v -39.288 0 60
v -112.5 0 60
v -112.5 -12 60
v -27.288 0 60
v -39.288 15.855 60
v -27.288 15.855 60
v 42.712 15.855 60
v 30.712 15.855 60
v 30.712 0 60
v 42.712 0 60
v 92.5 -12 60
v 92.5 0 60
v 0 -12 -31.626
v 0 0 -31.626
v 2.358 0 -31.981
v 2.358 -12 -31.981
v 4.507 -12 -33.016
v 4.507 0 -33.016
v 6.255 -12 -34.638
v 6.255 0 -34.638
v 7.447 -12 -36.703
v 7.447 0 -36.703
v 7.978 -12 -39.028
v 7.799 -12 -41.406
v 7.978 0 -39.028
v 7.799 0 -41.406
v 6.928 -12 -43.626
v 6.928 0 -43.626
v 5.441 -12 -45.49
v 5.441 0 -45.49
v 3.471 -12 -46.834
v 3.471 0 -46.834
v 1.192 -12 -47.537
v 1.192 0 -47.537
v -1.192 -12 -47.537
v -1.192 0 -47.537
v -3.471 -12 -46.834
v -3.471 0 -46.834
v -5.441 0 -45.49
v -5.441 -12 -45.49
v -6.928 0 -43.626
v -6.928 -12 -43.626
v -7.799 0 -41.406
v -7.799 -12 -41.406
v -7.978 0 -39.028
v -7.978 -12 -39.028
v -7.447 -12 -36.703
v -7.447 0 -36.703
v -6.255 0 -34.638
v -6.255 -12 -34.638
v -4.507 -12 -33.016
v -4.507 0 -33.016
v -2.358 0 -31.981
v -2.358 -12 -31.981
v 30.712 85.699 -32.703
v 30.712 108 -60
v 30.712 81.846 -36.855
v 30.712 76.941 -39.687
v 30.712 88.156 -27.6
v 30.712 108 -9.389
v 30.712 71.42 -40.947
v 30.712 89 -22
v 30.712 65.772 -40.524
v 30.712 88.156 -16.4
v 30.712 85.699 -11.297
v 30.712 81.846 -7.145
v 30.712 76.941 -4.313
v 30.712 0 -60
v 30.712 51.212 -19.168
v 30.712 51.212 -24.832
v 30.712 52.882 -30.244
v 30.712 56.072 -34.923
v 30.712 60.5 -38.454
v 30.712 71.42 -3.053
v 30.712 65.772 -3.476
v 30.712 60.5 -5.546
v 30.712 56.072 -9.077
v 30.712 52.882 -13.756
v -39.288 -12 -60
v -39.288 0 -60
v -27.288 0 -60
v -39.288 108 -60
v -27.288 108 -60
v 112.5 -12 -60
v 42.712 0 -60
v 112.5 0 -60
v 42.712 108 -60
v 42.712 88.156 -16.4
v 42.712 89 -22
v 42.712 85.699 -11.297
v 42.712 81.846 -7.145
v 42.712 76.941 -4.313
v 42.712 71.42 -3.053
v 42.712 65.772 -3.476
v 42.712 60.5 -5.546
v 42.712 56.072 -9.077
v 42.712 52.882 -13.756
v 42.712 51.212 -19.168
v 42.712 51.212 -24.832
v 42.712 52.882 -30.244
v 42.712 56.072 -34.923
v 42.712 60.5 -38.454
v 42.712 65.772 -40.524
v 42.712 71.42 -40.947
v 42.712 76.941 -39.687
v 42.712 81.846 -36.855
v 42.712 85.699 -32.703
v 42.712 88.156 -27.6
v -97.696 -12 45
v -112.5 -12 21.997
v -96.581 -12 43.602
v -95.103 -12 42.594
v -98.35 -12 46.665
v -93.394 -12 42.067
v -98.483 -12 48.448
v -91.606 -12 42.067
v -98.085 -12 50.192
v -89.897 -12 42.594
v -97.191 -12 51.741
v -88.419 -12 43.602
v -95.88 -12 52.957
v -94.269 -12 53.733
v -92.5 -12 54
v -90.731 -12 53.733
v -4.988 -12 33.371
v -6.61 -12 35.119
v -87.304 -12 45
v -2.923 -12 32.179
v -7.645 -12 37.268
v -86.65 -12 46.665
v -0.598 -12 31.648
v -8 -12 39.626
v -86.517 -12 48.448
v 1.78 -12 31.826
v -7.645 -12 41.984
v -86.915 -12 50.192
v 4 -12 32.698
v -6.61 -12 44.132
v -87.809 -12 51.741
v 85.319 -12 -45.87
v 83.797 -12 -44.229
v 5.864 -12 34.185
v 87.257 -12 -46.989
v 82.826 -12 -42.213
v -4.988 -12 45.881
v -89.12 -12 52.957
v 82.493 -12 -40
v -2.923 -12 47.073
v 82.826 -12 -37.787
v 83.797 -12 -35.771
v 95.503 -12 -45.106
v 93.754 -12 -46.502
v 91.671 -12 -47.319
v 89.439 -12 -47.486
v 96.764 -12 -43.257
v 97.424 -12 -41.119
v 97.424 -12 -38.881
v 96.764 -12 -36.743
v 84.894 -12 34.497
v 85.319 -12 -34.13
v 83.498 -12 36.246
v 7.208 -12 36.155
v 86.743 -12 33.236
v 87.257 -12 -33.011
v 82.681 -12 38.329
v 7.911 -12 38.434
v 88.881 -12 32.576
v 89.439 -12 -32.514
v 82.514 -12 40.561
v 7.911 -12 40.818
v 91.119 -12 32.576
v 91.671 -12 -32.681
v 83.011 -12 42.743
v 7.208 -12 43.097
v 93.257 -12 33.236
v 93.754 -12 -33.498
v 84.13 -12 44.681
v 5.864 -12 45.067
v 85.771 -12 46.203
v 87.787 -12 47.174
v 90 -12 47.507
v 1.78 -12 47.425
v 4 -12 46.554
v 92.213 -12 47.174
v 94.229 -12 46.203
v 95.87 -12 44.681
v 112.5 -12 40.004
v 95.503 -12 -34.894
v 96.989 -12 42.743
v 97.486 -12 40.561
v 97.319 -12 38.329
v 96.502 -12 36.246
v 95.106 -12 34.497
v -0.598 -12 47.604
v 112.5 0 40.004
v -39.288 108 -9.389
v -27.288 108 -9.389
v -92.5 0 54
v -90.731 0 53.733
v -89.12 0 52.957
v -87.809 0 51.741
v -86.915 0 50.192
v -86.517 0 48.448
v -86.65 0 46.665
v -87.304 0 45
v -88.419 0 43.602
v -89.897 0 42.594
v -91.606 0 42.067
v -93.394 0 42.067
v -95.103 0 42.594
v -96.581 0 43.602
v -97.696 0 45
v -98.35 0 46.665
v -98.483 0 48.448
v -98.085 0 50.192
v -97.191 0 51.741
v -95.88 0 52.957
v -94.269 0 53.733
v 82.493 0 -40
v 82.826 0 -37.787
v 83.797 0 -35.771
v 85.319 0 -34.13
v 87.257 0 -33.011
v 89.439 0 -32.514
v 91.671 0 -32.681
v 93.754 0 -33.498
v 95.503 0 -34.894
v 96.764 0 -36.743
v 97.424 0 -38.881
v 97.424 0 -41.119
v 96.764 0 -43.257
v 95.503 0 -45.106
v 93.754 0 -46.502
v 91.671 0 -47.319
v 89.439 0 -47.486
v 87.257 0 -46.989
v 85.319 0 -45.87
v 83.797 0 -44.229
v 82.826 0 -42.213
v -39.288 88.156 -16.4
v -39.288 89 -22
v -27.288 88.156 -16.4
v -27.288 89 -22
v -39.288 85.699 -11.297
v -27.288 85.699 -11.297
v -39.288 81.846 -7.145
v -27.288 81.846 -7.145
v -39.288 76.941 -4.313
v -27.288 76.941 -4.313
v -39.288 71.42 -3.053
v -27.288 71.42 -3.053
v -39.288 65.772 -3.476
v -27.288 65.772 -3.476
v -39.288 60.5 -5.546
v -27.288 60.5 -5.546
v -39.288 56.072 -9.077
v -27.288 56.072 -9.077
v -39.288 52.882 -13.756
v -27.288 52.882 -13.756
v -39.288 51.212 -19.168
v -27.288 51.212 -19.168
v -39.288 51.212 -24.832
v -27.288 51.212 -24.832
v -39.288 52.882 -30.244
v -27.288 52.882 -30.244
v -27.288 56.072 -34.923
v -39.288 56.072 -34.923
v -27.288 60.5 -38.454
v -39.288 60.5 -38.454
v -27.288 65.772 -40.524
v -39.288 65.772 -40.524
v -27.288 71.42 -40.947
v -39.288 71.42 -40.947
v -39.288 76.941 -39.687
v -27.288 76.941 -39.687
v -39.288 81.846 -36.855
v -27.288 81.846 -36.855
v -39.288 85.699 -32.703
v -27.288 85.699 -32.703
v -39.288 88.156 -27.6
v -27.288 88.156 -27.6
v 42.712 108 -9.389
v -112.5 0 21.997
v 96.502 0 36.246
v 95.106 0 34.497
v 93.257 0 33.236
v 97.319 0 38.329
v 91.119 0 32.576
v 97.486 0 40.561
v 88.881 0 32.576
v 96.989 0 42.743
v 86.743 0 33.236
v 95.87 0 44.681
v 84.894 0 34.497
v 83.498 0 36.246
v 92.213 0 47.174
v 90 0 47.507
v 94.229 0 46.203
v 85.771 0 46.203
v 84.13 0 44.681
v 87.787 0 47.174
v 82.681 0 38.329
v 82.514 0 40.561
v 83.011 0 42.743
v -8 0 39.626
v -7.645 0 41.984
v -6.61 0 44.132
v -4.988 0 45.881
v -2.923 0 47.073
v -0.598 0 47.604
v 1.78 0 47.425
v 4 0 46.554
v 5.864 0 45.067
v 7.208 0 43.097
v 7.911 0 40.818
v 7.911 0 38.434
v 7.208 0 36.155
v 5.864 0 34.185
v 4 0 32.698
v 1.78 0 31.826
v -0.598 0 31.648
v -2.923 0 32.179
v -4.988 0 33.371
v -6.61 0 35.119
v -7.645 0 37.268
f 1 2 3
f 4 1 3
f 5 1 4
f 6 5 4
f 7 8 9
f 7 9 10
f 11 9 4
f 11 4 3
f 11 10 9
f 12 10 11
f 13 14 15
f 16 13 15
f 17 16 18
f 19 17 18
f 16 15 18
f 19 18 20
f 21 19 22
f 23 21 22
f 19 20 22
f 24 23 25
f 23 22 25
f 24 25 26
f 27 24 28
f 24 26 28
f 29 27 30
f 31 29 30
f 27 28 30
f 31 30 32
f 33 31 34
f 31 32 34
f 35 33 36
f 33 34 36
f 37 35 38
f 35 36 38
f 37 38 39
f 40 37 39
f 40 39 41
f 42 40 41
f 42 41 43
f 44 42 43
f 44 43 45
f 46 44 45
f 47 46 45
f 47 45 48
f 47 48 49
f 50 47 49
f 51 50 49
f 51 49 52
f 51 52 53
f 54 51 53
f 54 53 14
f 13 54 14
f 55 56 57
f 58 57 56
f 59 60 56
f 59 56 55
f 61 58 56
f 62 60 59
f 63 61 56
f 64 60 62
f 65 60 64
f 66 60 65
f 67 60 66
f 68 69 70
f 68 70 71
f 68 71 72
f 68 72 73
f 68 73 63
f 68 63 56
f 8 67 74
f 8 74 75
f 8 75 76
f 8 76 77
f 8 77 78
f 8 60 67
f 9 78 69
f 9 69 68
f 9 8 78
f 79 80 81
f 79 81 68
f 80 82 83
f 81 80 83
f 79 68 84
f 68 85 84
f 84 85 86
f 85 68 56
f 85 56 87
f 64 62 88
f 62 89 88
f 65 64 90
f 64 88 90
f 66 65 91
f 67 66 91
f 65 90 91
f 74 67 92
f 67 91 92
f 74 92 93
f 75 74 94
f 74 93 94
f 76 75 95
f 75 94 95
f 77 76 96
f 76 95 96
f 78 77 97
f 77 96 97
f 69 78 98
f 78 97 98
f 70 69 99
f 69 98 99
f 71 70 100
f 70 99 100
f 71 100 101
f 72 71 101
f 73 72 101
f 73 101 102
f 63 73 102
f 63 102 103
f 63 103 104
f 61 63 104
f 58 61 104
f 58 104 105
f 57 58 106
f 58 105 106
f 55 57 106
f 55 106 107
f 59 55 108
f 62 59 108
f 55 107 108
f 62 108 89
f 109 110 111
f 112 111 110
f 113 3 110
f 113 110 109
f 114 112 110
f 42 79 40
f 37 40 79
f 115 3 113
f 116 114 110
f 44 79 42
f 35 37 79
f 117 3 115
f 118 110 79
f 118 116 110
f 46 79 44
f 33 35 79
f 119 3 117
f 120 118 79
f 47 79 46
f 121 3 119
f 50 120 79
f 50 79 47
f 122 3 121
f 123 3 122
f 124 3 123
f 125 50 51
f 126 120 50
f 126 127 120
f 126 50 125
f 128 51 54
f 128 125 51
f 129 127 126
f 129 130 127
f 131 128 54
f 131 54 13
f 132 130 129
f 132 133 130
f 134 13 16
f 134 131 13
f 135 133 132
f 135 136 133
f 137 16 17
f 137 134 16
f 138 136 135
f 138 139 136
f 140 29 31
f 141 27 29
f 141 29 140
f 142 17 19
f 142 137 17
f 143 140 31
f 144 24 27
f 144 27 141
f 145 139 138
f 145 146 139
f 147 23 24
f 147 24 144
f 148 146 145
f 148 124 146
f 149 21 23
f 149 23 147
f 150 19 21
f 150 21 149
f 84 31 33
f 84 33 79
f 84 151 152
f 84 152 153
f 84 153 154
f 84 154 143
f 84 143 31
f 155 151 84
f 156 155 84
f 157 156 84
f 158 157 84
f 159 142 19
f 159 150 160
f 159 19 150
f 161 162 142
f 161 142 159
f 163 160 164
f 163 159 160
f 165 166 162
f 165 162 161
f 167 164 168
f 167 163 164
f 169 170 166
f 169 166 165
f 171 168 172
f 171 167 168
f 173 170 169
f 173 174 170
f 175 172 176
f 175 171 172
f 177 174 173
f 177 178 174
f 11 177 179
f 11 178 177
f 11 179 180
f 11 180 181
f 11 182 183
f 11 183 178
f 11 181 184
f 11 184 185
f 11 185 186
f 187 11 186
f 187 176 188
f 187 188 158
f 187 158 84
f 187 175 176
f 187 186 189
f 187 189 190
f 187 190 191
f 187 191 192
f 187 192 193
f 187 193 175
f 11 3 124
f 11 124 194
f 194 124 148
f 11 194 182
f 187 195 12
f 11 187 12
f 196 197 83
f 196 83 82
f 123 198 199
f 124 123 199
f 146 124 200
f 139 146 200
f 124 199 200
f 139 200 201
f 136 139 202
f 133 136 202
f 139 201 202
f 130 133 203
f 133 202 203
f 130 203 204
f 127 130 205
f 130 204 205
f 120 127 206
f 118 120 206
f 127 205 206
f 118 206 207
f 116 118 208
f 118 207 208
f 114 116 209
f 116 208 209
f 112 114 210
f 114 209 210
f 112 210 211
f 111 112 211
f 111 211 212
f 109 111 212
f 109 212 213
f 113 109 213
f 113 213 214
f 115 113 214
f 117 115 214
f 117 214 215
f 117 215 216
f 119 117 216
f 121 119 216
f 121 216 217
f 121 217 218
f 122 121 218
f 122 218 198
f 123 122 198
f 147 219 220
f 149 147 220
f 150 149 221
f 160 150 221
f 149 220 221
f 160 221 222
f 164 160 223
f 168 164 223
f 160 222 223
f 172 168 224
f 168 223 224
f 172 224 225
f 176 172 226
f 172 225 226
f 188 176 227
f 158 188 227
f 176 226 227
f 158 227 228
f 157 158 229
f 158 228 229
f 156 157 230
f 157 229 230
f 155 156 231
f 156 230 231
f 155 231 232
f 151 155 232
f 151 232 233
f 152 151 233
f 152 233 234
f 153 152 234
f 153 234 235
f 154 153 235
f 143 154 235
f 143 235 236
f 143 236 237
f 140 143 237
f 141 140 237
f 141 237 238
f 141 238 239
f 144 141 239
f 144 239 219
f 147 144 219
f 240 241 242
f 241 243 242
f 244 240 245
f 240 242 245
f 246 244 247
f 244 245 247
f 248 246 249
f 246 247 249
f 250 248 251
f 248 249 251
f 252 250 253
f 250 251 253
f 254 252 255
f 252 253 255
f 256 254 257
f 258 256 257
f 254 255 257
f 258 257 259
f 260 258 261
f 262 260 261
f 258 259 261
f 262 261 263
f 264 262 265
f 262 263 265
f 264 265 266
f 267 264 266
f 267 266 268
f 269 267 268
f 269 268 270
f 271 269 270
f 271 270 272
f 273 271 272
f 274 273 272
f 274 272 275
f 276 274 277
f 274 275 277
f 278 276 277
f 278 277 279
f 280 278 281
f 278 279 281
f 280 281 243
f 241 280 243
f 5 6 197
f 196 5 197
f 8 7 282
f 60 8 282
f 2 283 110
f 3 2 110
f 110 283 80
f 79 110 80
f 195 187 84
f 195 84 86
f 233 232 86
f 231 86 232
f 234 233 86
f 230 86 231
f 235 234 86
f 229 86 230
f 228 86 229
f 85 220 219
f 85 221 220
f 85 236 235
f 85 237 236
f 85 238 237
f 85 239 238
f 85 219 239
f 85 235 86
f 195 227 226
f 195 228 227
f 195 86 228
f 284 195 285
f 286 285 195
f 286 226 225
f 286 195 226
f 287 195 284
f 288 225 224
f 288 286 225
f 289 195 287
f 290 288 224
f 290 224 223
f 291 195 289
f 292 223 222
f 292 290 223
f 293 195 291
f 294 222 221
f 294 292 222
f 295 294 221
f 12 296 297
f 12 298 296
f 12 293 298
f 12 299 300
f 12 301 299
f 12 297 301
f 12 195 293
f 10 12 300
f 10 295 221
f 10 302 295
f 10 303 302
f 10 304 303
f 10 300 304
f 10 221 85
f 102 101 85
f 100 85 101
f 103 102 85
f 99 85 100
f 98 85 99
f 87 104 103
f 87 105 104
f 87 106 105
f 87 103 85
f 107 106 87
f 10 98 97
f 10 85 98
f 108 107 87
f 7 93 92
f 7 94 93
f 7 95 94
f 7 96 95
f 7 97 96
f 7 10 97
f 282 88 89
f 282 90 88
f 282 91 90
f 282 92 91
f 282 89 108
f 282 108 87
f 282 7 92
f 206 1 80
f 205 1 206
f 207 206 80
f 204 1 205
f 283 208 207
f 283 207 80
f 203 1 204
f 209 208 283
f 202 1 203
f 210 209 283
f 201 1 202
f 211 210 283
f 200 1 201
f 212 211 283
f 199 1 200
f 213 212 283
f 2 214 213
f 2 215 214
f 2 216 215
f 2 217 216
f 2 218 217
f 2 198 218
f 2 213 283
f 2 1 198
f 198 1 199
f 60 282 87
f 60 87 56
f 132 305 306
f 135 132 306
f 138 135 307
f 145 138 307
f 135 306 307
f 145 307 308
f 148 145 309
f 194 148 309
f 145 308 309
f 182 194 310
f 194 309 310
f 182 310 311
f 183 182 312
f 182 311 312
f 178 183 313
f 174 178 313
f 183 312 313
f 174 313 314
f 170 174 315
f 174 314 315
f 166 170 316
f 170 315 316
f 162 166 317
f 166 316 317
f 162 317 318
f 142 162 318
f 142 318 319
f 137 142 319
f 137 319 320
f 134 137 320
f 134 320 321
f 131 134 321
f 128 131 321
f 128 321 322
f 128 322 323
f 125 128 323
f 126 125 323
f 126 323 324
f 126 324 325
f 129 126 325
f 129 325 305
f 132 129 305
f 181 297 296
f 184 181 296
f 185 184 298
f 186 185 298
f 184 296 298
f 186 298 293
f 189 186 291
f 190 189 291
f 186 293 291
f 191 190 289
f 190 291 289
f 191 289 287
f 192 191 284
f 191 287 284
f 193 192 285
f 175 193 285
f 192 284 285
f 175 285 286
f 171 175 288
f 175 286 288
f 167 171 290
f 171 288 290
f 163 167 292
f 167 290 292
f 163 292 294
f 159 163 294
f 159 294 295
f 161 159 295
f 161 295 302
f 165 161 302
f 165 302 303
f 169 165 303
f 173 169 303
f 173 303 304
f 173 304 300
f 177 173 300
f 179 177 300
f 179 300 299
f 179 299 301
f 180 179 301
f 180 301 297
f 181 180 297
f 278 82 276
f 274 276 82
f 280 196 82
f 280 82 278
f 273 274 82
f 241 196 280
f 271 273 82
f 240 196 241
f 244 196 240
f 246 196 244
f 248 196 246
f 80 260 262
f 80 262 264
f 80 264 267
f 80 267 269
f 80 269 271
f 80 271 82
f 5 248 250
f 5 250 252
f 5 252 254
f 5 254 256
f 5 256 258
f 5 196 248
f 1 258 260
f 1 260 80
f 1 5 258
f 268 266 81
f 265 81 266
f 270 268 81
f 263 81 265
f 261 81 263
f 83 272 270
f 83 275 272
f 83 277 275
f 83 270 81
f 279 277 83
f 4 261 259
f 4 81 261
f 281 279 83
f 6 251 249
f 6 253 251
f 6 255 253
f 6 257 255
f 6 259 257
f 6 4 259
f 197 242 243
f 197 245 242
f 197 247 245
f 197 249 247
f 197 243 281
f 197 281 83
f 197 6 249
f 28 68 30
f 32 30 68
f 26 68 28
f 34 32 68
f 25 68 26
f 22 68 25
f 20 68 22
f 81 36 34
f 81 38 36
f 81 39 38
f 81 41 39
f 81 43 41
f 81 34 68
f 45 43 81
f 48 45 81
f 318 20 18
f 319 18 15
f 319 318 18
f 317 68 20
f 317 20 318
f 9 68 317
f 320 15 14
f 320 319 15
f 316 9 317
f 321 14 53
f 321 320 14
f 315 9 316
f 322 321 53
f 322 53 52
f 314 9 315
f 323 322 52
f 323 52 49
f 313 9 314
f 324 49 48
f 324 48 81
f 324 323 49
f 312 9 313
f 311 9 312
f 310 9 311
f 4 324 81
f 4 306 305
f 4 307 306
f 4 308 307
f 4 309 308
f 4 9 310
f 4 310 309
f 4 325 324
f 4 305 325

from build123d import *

# Parameters (mm, degrees)
BOSS_EXTRUDE1_DEPTH = 60
CUT_EXTRUDE1_DEPTH  = 120
CUT_EXTRUDE2_DEPTH  = 120
CUT_EXTRUDE3_DEPTH  = 60
SKETCH7_R           = 19
CUT_EXTRUDE4_DEPTH  = 60
SKETCH10_R          = 8
SKETCH10_R_2        = 7.507478142
SKETCH10_R_3        = 6
CUT_EXTRUDE5_DEPTH  = 120


with BuildPart() as part:
    # Sketch1 → Boss-Extrude1 (new, symmetric)
    with BuildSketch(Plane.XY):
        Polygon((-112.5, 0), (-112.5, -12), (112.5, -12), (112.5, 0), (42.711972594, 0), (42.711972594, 108), (30.711972594, 108), (30.711972594, 0), (-27.288027406, 0), (-27.288027406, 108), (-39.288027406, 108), (-39.288027406, 0), align=None)
    extrude(amount=BOSS_EXTRUDE1_DEPTH, both=True)

    # Sketch2 → Cut-Extrude1 (cut)
    with BuildSketch(Plane(origin=(0, 0, 0), x_dir=(1, 0, 0), z_dir=(0, 1, 0))):
        Polygon((112.5, -60), (112.5, -40.004428551), (92.5, -60), align=None)
    extrude(amount=-CUT_EXTRUDE1_DEPTH, mode=Mode.SUBTRACT)

    # Sketch3 → Cut-Extrude2 (cut)
    with BuildSketch(Plane(origin=(0, 0, 0), x_dir=(1, 0, 0), z_dir=(0, 1, 0))):
        Polygon((-39.288027406, 60), (-112.5, 60), (-112.5, -21.997416505), align=None)
    extrude(amount=-CUT_EXTRUDE2_DEPTH, mode=Mode.SUBTRACT)

    # Sketch5 → Cut-Extrude3 (cut, symmetric)
    with BuildSketch(Plane(origin=(0, 0, 0), x_dir=(0, 0, -1), z_dir=(1, 0, 0))):
        Polygon((9.388870173, 108), (-60, 108), (-60, 15.855119955), align=None)
    extrude(amount=CUT_EXTRUDE3_DEPTH, both=True, mode=Mode.SUBTRACT)

    # Sketch7 → Cut-Extrude4 (cut, symmetric)
    with BuildSketch(Plane(origin=(0, 0, 0), x_dir=(0, 0, -1), z_dir=(1, 0, 0))):
        with Locations(Location((22, 70, 0), (0, 0, 90))):
            Circle(SKETCH7_R)
    extrude(amount=CUT_EXTRUDE4_DEPTH, both=True, mode=Mode.SUBTRACT)

    # Sketch10 → Cut-Extrude5 (cut)
    with BuildSketch(Plane(origin=(0, 0, 0), x_dir=(1, 0, 0), z_dir=(0, 1, 0))):
        with Locations(Location((0, 39.625914849, 0), (0, 0, 270))):
            Circle(SKETCH10_R)
        with Locations(Location((90, -40, 0), (0, 0, 270))):
            Circle(SKETCH10_R_2)
        with Locations(Location((-92.5, -48, 0), (0, 0, 270))):
            Circle(SKETCH10_R_3)
        with Locations(Location((0, -39.625914849, 0), (0, 0, 180))):
            Circle(SKETCH10_R)
        with Locations(Location((90, 40, 0), (0, 0, 180))):
            Circle(SKETCH10_R_2)
    extrude(amount=-CUT_EXTRUDE5_DEPTH, mode=Mode.SUBTRACT)


solid = part.part
